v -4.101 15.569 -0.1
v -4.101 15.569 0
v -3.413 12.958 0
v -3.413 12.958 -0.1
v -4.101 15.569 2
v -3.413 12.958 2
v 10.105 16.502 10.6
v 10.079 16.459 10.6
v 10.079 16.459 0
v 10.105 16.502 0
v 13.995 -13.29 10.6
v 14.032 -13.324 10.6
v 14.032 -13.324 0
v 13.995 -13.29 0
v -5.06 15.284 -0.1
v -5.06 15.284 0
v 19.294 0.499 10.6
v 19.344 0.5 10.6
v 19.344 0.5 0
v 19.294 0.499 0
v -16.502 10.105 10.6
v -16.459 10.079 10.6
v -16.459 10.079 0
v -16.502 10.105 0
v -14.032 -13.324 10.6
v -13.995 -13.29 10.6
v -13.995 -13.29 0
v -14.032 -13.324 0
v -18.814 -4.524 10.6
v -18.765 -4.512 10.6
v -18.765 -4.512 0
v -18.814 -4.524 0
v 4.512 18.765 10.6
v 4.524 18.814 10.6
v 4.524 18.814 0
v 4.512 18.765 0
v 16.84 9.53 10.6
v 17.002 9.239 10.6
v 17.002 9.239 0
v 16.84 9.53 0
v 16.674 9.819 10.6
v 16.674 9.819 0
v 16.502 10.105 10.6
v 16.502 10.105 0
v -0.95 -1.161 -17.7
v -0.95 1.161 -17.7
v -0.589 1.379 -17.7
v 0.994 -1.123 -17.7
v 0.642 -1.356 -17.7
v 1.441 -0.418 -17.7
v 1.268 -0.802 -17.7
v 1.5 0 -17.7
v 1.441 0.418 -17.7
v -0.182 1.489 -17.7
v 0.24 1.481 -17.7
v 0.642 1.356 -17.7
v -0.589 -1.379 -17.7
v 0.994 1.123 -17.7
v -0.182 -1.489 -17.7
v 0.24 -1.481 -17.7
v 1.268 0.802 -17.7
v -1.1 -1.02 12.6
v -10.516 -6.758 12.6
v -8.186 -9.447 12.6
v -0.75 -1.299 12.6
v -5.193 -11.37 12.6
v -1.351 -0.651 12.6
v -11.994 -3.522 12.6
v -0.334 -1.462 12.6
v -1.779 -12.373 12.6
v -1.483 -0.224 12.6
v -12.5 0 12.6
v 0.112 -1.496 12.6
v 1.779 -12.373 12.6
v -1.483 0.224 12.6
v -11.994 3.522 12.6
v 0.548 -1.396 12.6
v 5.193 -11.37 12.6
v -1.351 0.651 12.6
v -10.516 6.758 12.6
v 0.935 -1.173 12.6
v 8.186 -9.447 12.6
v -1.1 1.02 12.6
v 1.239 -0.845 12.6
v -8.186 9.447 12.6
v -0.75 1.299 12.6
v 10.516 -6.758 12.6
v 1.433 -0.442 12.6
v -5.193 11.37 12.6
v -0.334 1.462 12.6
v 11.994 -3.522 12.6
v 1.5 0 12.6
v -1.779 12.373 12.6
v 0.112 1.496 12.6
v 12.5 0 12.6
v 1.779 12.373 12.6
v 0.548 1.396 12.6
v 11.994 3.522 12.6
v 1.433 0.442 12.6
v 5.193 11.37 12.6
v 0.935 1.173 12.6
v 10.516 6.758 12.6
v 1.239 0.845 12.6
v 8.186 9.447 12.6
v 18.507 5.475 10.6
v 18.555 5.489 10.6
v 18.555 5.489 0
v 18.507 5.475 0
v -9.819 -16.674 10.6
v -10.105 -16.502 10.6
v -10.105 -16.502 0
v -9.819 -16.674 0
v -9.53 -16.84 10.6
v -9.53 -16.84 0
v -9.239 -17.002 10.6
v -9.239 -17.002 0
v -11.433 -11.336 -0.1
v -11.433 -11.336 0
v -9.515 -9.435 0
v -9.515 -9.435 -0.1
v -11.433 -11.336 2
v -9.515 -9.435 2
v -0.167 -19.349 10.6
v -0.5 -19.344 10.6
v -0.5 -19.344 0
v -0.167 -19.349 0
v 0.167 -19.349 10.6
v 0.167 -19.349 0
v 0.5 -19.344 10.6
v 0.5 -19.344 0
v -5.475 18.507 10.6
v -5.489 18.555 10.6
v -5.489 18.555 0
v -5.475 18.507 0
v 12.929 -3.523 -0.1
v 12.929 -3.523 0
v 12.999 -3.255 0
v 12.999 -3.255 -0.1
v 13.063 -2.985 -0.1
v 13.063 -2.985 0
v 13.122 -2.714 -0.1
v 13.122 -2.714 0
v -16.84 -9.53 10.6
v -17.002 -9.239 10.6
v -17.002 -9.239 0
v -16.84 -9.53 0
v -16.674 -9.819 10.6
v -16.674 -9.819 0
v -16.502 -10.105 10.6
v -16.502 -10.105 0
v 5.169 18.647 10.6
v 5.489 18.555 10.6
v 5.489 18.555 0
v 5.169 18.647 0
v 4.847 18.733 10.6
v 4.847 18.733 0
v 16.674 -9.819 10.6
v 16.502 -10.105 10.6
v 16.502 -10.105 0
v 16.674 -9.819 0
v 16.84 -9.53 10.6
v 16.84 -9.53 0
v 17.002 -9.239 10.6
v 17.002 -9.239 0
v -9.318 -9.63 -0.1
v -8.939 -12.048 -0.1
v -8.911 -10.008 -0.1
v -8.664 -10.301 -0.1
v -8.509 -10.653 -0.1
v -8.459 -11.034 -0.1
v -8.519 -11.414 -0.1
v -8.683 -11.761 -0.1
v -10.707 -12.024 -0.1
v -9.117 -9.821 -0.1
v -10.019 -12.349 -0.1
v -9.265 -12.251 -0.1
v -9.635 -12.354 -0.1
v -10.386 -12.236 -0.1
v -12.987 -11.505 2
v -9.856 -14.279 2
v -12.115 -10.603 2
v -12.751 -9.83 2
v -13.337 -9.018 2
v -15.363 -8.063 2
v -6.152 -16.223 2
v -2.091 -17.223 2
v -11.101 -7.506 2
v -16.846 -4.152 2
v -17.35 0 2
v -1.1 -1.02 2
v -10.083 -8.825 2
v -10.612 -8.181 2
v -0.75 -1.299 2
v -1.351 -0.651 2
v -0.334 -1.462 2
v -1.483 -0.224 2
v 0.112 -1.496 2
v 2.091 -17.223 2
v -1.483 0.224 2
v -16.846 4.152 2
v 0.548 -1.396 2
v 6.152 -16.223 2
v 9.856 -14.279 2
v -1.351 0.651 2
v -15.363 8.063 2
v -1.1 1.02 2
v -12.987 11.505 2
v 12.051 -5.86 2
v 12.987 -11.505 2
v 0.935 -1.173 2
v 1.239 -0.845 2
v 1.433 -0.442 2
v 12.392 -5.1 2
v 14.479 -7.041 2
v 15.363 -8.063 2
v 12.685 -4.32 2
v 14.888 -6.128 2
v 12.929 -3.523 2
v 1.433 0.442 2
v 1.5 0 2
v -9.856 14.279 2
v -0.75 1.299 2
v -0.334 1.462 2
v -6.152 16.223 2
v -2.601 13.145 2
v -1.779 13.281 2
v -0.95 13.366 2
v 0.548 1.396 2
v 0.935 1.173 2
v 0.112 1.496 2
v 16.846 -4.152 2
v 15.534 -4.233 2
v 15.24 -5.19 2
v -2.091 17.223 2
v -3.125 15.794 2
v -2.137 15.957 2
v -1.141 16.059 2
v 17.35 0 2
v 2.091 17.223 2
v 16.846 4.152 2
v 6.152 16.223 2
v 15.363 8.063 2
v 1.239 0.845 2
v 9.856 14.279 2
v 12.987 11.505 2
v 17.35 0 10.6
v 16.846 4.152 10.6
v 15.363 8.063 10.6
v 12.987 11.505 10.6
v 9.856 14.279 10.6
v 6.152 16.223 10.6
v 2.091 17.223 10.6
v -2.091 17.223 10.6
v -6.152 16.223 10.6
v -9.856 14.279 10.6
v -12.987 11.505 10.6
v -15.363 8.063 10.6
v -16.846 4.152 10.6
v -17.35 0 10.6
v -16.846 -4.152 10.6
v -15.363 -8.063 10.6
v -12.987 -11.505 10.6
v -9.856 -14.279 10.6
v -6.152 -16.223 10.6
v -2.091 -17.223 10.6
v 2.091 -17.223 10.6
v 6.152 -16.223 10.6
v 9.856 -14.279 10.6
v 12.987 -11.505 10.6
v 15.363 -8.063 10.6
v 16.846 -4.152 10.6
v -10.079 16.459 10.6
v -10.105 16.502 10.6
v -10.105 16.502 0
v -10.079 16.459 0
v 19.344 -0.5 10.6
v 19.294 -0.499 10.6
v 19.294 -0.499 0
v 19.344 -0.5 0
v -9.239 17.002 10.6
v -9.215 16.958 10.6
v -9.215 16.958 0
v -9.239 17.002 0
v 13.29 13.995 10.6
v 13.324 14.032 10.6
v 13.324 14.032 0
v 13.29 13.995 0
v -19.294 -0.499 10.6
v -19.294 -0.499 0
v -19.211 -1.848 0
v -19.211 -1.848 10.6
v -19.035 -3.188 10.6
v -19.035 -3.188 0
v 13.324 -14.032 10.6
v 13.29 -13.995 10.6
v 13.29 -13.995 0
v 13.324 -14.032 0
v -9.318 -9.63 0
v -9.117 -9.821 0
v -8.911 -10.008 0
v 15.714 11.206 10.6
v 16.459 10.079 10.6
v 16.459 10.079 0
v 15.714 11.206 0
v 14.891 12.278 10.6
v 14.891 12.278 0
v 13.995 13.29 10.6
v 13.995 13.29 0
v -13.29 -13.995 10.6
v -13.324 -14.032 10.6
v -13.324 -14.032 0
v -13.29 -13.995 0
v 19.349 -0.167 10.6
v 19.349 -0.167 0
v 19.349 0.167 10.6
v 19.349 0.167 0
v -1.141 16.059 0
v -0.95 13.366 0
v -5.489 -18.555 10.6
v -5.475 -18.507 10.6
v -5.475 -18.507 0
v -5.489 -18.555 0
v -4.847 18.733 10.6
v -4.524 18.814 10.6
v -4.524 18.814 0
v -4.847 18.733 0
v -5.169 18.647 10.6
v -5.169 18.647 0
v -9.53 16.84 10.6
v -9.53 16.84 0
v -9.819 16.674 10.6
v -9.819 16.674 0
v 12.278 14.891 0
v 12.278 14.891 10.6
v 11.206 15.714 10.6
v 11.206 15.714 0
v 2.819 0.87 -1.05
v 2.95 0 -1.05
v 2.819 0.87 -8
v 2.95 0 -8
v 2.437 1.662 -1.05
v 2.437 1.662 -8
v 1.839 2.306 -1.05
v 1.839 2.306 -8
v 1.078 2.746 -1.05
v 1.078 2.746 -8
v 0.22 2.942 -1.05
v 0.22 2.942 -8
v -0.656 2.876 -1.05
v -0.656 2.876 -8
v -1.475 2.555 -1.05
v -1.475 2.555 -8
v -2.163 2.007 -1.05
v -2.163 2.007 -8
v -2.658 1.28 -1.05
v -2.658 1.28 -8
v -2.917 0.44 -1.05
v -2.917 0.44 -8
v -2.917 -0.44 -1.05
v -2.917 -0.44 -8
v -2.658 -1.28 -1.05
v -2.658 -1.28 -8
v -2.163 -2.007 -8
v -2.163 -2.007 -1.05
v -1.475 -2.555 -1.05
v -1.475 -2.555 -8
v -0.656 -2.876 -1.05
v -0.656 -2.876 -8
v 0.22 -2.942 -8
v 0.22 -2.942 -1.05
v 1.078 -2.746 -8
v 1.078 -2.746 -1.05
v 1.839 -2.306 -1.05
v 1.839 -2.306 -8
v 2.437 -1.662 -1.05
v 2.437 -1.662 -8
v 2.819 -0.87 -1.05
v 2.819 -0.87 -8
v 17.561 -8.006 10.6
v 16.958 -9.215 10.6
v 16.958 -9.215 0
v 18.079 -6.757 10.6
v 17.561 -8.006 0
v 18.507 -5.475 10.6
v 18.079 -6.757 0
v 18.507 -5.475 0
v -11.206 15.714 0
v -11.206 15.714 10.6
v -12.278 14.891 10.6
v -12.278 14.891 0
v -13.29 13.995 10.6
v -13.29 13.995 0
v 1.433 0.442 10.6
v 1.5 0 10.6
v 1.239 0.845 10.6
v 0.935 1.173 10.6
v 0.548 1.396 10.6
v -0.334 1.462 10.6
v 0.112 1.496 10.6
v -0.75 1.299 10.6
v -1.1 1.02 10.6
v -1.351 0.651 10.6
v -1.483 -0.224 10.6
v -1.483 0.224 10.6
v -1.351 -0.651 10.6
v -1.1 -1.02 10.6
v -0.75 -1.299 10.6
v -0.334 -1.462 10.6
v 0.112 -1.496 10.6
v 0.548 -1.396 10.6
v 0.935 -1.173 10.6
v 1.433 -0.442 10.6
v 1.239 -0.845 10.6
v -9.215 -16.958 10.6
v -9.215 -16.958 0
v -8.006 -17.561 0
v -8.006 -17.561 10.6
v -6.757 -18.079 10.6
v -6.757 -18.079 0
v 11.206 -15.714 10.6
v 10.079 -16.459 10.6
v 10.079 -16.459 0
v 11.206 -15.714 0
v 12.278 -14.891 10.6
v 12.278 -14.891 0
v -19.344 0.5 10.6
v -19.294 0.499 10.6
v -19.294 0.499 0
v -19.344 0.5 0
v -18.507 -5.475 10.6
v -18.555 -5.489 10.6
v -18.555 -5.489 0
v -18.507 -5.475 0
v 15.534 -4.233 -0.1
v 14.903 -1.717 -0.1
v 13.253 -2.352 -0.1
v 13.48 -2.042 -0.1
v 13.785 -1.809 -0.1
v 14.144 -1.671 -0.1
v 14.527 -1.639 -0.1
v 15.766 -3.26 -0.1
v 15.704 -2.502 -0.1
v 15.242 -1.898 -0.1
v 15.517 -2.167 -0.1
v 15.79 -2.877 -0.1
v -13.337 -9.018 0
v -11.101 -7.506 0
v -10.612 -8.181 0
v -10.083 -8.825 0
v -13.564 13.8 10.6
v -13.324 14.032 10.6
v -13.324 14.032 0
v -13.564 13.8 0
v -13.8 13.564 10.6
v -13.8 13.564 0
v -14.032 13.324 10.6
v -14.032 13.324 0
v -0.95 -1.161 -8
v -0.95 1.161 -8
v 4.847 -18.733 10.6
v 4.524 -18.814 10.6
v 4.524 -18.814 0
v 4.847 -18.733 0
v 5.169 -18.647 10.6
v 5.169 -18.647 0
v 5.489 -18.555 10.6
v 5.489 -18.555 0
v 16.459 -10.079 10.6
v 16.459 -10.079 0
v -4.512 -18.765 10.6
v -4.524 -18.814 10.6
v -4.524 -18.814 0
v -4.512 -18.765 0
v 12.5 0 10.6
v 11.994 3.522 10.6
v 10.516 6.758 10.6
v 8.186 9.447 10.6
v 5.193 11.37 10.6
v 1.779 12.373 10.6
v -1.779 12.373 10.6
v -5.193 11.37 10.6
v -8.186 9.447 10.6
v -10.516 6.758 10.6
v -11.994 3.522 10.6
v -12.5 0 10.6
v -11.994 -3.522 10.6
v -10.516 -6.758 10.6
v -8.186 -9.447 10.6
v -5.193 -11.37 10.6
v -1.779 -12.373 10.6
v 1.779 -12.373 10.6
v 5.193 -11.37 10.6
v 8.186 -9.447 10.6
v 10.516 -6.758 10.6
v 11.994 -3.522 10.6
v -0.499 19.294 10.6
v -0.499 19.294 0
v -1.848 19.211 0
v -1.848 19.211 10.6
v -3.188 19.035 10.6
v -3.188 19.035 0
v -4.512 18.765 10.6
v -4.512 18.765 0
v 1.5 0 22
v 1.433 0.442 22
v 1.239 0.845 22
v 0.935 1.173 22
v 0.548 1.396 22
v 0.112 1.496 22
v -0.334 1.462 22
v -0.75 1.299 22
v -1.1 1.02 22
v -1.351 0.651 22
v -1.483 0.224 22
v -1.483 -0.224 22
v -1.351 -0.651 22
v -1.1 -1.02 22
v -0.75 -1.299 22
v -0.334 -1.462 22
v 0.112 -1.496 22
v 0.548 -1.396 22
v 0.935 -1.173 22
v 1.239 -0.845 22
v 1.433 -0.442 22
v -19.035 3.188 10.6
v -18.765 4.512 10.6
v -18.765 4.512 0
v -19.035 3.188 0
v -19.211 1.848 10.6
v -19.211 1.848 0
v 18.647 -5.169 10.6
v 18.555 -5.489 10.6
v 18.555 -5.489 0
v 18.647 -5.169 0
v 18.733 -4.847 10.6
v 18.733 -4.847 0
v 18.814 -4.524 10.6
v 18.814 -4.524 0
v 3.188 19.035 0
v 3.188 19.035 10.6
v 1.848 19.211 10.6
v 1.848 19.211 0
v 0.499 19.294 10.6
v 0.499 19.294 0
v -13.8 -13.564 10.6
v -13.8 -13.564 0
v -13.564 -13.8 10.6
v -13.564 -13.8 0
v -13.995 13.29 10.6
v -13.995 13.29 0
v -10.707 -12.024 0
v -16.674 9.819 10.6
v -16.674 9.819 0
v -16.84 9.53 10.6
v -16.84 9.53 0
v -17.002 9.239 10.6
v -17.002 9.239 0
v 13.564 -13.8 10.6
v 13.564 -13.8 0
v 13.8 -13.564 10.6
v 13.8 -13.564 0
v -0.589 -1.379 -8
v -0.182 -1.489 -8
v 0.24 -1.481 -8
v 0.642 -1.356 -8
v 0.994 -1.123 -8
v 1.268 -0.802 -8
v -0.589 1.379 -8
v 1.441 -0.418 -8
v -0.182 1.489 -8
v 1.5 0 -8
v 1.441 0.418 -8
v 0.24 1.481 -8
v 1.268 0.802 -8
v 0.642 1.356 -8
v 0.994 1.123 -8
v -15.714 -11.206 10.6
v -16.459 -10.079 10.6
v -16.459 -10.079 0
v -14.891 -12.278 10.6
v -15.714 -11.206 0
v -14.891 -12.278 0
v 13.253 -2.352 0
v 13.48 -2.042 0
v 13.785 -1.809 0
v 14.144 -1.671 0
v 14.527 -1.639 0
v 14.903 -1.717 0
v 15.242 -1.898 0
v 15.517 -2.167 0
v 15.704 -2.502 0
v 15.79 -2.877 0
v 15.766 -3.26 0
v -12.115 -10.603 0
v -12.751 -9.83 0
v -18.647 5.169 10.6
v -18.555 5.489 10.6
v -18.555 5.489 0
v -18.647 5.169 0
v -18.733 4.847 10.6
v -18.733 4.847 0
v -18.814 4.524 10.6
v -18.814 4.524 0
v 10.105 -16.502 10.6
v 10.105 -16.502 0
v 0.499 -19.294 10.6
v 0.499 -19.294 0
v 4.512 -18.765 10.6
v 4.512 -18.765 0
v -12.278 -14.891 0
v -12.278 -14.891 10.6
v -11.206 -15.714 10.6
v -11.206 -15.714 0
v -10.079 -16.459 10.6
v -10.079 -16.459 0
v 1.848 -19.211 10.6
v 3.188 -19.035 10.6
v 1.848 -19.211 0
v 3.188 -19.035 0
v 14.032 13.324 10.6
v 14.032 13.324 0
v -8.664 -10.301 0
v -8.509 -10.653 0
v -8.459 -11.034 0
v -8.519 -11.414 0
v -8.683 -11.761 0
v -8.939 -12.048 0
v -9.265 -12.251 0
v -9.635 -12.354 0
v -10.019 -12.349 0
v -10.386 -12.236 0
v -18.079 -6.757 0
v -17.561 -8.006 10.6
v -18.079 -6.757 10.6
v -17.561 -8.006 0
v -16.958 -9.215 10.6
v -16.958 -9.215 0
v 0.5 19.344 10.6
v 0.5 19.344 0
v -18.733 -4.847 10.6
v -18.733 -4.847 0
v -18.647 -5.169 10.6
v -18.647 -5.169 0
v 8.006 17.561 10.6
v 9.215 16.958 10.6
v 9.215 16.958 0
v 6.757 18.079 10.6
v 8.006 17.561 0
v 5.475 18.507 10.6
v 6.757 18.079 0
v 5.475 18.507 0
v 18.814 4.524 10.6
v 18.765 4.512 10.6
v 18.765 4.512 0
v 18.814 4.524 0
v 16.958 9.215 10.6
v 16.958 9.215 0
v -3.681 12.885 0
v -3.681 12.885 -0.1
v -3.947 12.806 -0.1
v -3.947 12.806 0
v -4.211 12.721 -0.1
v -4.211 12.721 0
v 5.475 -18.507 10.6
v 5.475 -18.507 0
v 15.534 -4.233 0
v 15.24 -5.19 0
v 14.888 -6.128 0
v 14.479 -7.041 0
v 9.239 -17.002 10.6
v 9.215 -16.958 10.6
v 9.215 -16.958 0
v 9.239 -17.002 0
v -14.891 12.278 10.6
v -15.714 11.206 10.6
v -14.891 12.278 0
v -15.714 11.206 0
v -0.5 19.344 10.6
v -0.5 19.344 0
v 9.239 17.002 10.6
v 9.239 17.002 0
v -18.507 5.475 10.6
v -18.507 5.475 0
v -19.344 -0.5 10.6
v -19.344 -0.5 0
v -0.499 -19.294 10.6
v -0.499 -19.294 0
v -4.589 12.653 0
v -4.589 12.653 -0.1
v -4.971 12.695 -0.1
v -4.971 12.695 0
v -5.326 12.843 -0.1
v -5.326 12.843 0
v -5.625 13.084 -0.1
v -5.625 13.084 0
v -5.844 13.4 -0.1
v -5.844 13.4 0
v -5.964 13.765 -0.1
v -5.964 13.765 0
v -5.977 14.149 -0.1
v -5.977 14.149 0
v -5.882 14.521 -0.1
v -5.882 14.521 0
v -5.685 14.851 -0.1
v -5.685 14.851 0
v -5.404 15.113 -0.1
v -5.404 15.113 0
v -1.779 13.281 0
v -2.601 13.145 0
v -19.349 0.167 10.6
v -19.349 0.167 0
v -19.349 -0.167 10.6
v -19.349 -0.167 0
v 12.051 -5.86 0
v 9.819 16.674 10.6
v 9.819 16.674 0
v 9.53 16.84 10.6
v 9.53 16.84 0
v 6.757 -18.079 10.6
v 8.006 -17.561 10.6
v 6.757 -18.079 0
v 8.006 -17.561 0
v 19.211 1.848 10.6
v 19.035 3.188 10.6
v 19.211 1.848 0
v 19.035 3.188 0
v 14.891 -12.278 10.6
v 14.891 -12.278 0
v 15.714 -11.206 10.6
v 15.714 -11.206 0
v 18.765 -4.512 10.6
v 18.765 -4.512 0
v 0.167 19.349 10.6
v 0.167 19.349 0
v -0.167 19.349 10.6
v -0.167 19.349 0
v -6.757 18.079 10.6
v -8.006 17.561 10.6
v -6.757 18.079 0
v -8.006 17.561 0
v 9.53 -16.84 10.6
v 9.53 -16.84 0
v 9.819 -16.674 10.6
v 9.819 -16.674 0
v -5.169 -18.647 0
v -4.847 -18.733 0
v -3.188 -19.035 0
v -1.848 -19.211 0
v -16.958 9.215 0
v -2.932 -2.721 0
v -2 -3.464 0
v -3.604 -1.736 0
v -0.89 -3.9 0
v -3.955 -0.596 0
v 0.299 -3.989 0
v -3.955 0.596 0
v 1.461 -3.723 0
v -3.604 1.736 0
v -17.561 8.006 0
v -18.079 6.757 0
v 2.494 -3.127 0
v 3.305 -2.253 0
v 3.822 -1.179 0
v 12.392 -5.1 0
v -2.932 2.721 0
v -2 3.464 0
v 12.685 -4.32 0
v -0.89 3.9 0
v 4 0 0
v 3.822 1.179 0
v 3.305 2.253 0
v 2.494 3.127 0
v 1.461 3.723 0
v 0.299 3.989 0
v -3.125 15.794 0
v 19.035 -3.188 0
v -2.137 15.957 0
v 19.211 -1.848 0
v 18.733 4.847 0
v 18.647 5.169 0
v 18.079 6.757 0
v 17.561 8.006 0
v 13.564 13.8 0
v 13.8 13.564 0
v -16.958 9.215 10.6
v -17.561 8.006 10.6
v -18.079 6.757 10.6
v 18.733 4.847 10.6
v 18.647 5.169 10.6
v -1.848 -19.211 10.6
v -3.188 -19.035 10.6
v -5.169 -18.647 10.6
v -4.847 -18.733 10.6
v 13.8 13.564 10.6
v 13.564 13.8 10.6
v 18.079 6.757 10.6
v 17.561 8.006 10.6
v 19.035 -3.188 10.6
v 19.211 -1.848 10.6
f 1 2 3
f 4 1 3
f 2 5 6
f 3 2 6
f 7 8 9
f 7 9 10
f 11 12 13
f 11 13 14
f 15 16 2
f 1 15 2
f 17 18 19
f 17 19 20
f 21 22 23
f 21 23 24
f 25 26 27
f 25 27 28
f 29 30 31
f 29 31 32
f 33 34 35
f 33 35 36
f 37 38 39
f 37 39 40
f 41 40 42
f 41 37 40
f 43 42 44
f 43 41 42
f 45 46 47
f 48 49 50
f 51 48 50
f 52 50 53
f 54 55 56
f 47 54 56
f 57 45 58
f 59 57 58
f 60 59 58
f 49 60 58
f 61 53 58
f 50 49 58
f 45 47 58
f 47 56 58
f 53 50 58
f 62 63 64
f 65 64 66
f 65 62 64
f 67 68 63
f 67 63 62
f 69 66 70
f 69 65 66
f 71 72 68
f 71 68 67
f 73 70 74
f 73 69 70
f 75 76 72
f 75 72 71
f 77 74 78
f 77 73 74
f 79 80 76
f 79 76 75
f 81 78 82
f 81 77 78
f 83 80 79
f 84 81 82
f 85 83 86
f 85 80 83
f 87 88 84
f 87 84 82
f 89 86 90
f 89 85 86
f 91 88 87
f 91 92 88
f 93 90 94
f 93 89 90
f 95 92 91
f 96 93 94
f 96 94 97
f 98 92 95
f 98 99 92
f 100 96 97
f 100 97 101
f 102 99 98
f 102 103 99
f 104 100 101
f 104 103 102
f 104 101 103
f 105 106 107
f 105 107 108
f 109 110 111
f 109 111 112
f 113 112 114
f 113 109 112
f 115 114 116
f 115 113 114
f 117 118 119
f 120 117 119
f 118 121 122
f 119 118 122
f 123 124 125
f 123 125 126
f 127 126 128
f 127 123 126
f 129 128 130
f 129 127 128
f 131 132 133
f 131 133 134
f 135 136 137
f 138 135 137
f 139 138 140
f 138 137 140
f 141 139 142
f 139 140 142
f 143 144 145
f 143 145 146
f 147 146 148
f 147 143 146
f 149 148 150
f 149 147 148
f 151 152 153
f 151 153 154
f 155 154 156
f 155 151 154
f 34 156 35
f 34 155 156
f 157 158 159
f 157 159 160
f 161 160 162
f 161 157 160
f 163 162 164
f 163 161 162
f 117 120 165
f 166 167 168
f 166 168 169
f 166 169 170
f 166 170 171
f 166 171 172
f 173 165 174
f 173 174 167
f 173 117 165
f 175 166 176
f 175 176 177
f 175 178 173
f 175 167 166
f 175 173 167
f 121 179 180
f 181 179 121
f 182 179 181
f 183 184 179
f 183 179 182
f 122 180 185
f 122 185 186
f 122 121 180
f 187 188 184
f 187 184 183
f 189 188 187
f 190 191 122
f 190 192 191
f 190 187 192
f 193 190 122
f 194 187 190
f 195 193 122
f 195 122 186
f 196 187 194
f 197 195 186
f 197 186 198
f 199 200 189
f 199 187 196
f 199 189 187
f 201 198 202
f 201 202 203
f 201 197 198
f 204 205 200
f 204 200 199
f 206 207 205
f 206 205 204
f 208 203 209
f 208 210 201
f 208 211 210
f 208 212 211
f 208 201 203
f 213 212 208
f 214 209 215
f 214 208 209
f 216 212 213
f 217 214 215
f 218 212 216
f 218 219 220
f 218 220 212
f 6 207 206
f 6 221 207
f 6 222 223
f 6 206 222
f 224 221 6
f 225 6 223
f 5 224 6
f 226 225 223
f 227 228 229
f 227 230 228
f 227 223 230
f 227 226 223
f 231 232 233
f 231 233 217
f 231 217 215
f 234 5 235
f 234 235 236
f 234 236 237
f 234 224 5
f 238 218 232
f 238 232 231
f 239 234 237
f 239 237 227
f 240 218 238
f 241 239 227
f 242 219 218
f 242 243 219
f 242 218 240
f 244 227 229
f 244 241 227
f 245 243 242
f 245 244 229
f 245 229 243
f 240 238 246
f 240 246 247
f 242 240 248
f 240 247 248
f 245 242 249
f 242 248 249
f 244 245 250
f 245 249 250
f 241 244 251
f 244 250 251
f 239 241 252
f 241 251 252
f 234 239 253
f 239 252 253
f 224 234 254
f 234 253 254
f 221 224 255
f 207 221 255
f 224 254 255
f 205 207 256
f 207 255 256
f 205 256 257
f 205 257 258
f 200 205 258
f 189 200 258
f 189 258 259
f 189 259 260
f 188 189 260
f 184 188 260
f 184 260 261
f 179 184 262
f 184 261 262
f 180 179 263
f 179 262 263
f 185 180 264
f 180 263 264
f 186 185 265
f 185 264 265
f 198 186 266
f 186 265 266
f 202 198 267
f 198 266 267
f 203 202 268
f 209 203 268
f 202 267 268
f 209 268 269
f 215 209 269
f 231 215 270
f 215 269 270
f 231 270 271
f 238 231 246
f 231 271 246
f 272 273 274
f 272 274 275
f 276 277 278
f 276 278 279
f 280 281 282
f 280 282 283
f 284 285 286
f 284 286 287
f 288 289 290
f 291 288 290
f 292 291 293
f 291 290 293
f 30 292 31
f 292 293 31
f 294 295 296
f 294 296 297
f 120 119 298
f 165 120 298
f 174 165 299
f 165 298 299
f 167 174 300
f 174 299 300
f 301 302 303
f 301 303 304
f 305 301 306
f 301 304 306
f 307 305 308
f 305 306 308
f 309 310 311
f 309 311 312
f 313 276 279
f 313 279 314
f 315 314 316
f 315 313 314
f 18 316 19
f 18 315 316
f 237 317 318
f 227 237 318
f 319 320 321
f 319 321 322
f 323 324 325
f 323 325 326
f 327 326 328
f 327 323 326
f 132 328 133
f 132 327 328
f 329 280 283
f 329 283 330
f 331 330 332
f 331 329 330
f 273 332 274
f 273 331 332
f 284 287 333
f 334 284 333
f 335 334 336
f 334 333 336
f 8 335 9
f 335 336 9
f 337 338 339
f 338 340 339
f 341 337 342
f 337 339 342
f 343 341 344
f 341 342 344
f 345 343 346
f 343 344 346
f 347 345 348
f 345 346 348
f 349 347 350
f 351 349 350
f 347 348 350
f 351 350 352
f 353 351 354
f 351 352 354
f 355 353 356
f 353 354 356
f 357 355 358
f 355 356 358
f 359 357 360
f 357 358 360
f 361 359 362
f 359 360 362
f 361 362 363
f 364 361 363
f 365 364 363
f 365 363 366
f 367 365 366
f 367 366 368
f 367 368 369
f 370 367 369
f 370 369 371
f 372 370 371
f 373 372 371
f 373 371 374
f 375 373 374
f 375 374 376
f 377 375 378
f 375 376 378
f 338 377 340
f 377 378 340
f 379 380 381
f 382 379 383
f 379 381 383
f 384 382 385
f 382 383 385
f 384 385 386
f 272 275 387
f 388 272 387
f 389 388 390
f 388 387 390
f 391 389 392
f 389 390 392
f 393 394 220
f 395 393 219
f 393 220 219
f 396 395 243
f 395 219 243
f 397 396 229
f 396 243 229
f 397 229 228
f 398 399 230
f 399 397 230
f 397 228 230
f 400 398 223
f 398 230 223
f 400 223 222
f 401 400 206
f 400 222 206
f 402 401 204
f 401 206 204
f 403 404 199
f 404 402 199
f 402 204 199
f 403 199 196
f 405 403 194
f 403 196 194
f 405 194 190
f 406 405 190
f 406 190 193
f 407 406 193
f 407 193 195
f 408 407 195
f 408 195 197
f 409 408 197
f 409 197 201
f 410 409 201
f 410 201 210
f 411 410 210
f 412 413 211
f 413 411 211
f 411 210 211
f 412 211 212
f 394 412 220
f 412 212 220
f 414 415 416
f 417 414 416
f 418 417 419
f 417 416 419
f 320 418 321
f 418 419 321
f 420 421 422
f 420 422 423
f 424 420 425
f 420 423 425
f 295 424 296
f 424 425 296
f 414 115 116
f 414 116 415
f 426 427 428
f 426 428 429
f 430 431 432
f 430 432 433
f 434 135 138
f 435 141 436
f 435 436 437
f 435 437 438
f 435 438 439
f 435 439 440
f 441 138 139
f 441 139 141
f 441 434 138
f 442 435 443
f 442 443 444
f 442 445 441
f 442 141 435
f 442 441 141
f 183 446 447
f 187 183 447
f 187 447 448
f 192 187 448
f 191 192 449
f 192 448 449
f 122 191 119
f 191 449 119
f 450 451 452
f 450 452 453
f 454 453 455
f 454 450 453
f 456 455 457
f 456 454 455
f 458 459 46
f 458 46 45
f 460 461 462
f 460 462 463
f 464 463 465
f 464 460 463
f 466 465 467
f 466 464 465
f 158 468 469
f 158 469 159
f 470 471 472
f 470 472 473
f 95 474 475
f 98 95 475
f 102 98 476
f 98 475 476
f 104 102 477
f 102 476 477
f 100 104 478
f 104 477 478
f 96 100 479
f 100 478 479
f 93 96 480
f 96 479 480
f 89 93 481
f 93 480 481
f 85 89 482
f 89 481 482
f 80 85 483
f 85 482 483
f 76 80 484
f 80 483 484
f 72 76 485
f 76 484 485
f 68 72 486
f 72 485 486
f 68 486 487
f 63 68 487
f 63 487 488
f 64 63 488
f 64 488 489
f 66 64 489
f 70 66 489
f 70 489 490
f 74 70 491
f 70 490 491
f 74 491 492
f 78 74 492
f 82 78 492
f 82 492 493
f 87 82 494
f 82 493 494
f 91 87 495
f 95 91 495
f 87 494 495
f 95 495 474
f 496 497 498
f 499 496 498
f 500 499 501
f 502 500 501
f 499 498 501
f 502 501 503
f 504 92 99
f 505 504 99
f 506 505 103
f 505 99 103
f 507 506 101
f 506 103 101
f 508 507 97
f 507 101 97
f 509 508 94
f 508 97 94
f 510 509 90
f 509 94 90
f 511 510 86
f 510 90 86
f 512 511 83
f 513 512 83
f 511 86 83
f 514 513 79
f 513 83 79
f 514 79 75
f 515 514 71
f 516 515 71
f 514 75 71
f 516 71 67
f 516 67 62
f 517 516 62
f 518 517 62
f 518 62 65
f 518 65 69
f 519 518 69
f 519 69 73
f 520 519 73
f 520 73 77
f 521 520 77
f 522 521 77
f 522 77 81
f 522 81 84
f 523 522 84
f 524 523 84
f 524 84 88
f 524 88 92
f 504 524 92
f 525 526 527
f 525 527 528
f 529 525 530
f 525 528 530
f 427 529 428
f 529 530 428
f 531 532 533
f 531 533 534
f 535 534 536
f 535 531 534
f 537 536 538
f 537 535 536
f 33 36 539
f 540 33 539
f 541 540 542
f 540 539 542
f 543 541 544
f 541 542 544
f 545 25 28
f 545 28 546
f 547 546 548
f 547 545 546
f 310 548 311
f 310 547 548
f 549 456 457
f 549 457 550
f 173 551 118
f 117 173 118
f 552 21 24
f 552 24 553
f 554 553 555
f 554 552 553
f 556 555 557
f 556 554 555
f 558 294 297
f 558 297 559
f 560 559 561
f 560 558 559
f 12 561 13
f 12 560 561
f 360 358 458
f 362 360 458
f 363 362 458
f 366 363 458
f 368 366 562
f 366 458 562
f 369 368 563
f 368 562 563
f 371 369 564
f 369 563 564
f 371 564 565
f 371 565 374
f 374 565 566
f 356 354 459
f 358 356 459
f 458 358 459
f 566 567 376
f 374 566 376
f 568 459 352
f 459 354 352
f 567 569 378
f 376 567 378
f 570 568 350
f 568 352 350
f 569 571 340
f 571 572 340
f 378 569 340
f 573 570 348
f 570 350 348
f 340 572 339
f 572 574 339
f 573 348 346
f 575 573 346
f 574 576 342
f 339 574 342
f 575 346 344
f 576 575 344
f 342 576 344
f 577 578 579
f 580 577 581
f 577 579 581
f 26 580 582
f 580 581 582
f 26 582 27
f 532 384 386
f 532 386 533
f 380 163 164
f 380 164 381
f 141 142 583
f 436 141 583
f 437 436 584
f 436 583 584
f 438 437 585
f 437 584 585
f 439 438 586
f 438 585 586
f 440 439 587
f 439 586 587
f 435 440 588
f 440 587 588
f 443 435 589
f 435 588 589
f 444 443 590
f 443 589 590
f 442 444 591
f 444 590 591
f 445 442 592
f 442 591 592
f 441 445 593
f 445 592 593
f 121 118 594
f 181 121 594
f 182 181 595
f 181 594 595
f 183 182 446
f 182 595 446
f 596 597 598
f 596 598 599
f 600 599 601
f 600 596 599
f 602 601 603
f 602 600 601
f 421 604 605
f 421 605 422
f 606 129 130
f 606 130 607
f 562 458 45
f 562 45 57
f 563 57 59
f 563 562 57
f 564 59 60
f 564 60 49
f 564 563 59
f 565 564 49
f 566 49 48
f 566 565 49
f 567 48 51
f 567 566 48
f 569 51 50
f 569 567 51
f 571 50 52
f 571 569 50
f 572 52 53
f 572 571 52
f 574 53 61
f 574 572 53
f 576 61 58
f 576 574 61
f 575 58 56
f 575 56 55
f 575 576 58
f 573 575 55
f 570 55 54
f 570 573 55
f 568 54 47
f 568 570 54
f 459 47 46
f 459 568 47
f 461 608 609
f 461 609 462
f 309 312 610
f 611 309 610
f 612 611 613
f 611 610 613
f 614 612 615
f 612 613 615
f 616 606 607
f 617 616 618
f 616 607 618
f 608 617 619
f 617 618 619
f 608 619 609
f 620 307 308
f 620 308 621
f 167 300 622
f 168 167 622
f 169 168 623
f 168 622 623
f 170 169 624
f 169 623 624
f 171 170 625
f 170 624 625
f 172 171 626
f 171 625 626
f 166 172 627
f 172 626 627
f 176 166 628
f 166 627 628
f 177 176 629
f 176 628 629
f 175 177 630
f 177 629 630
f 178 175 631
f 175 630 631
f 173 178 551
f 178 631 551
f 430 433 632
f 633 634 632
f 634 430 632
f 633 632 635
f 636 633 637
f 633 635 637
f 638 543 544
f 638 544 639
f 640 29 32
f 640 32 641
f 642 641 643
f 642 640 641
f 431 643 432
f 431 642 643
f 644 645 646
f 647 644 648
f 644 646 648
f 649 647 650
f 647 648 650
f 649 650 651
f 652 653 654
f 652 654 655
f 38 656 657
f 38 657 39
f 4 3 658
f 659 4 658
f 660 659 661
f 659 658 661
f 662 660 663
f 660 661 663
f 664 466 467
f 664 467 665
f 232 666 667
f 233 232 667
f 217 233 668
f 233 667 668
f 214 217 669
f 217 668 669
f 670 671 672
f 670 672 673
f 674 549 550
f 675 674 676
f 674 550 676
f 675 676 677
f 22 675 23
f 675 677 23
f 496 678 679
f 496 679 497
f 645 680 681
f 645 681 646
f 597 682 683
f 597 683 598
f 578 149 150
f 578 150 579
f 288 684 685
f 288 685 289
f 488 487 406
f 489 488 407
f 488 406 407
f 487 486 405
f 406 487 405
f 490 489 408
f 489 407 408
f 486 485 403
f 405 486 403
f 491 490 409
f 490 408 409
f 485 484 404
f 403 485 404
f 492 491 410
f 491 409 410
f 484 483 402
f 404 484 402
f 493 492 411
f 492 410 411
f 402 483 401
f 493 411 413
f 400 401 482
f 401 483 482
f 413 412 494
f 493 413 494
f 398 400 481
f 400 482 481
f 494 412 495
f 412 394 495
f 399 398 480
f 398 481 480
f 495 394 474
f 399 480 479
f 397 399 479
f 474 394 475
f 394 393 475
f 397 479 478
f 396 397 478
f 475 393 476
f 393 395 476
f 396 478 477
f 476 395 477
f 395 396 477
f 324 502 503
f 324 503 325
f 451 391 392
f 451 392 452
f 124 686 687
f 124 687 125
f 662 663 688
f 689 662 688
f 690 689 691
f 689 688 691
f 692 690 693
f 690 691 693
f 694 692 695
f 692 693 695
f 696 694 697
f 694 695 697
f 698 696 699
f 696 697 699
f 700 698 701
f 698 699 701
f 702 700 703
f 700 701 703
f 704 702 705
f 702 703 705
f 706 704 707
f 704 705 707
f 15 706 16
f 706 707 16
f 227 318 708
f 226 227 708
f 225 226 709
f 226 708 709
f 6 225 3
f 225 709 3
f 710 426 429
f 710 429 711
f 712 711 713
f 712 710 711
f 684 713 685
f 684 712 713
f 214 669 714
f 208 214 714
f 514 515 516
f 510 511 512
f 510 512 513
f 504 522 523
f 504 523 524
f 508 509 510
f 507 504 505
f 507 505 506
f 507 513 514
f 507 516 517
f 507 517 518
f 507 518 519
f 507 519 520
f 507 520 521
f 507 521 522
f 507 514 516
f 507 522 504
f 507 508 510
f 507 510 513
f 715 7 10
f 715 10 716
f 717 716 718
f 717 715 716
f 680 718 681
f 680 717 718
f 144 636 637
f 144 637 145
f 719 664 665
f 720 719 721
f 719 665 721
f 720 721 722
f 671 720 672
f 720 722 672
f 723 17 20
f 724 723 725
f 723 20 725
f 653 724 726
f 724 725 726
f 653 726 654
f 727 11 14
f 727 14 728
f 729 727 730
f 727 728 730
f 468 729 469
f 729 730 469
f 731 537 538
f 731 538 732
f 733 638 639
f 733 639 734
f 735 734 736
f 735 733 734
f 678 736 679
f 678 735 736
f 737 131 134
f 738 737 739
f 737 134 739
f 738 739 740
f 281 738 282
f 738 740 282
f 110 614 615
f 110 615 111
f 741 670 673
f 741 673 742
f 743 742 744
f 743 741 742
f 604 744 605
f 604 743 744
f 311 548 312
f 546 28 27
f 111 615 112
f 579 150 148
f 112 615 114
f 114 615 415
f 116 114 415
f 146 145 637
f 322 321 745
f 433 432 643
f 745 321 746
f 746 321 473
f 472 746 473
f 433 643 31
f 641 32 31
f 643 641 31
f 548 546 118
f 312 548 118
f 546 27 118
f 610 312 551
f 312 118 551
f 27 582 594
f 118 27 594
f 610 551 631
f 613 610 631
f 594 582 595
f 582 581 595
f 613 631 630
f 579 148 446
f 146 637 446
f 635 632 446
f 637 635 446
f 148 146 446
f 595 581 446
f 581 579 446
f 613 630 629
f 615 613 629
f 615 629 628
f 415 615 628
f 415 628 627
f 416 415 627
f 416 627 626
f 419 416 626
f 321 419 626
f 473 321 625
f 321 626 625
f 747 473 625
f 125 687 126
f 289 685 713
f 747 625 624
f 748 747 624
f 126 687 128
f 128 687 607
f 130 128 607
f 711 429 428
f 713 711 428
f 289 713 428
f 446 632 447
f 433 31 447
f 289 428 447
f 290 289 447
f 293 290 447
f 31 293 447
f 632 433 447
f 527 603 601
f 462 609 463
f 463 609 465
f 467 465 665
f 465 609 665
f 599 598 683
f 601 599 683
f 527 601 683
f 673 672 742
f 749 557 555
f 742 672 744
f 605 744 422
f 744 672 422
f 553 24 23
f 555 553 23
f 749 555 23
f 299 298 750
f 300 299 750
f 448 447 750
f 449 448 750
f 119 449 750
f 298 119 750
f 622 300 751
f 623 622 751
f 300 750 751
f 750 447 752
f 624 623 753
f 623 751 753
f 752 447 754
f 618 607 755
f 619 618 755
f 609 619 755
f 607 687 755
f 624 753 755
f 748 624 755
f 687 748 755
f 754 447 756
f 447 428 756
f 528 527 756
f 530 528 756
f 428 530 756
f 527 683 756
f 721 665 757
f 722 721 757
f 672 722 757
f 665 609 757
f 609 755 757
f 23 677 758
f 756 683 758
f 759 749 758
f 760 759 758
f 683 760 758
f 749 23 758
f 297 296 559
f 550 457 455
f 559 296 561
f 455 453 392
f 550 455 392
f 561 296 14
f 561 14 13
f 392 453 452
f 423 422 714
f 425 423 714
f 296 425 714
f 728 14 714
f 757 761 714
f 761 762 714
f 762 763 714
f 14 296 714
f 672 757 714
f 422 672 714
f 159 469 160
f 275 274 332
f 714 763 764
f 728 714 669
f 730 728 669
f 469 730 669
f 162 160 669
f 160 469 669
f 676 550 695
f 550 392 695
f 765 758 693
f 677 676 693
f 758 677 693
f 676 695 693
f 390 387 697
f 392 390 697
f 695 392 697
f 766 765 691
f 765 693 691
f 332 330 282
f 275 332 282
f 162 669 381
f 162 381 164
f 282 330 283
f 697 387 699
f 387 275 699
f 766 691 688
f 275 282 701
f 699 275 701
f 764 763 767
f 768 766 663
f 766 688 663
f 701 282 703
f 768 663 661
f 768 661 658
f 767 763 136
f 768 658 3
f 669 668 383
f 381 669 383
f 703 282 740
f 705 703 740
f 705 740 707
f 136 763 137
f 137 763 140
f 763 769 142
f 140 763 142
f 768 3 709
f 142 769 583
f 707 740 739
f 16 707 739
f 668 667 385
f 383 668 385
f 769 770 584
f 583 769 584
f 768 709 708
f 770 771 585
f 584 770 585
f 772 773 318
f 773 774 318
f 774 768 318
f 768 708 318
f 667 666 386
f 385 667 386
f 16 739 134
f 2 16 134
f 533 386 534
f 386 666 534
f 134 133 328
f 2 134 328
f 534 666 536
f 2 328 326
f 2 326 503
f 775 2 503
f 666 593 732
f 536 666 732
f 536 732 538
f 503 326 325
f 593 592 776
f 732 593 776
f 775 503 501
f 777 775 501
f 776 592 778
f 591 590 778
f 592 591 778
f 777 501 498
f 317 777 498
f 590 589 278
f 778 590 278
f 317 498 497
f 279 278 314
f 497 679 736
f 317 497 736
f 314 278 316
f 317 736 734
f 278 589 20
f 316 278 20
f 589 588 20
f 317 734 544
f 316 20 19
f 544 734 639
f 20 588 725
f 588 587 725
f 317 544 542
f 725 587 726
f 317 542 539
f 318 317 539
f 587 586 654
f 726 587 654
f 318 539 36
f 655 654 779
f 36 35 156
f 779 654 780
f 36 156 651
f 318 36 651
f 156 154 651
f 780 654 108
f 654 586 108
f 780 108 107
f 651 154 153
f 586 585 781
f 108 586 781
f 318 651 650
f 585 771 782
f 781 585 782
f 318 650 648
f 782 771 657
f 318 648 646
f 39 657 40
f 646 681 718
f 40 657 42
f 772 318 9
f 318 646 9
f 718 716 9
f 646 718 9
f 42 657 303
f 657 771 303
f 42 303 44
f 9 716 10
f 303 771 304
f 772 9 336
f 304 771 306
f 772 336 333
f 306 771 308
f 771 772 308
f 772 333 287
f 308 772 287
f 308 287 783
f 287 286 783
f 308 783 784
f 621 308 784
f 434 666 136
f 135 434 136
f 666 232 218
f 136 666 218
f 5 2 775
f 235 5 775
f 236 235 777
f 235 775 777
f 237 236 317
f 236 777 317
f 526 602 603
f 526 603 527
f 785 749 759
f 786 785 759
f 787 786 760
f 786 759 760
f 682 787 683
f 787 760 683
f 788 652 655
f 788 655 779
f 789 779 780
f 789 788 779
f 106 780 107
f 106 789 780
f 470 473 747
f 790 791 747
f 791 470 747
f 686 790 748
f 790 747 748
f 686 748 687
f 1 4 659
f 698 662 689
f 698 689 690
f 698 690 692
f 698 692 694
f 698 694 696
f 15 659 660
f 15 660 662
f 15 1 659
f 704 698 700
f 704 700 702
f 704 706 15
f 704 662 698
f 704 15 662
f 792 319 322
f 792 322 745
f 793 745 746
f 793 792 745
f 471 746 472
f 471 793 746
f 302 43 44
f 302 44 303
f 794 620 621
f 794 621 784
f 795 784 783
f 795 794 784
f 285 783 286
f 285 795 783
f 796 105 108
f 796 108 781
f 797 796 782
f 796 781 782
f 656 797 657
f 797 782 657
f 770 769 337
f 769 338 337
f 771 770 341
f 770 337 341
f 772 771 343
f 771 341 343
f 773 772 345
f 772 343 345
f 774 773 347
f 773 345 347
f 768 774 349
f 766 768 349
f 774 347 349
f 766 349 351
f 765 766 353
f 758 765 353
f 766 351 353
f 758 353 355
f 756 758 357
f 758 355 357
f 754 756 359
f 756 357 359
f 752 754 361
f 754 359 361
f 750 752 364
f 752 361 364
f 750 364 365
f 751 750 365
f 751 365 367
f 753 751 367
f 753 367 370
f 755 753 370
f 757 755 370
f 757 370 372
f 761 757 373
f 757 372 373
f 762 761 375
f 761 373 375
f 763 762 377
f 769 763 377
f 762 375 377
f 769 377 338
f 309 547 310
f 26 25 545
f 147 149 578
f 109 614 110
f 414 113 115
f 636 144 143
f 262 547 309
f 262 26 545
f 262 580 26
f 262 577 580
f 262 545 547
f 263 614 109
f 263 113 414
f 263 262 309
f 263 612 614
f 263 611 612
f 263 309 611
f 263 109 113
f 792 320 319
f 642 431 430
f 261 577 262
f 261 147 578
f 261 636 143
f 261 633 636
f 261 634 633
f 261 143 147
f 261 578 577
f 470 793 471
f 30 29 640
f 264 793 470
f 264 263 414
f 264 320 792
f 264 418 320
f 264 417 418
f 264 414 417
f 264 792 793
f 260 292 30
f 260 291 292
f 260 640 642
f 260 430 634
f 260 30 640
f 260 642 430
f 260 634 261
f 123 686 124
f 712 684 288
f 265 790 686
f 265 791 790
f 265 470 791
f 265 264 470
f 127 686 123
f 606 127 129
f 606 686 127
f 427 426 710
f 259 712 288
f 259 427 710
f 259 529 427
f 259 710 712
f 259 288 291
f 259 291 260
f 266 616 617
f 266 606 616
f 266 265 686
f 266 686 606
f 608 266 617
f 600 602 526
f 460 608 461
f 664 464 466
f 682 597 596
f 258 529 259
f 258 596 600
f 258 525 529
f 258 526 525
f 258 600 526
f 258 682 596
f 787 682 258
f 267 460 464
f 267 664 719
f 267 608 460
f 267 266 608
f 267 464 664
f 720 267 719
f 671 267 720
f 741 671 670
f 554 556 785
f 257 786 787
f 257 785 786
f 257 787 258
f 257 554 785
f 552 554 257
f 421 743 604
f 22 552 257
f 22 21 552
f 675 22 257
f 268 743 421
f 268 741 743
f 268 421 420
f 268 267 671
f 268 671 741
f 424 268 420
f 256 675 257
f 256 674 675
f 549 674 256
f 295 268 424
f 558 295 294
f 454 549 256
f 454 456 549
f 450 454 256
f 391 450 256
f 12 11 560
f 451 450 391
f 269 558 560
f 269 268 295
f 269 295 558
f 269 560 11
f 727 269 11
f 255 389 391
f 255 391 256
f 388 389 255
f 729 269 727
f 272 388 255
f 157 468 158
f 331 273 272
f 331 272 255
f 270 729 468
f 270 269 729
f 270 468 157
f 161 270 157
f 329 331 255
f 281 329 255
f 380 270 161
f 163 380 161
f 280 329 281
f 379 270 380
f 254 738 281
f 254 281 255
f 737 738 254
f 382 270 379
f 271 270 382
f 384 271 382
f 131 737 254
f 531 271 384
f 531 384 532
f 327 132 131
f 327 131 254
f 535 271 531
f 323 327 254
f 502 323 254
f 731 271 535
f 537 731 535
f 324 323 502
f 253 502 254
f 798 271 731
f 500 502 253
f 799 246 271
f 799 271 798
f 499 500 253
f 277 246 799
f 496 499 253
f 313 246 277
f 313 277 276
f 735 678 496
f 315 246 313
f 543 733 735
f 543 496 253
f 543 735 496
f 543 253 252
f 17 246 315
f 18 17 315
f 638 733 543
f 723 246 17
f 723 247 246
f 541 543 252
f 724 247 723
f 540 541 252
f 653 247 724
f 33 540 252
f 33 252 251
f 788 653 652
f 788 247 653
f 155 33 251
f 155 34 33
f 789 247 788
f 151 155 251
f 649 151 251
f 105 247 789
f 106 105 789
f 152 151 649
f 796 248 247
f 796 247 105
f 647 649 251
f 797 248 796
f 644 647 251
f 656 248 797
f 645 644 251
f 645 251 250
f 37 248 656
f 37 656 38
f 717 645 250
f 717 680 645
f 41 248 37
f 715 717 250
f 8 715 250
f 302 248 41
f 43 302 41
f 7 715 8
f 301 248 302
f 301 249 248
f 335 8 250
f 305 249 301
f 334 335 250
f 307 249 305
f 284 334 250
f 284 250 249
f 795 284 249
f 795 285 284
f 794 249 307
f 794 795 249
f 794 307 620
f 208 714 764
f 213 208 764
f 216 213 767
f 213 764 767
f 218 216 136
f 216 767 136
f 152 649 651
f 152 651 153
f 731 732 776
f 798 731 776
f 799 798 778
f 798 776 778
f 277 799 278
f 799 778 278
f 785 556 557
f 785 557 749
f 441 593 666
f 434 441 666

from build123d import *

# Parameters (mm, degrees)
SKETCH1_R           = 19.3
BOSS_EXTRUDE1_DEPTH = 10.6
BOSS_EXTRUDE3_DEPTH = 10.6
SKETCH8_R           = 17.35
CUT_EXTRUDE2_DEPTH  = 8.6
CIRPATTERN1_COUNT   = 24
BOSS_EXTRUDE4_DEPTH = 9.7
CUT_EXTRUDE1_DEPTH  = 11.6
BOSS_EXTRUDE5_DEPTH = 0.1
CIRPATTERN2_COUNT   = 3
SKETCH10_R          = 1.5
BOSS_EXTRUDE6_DEPTH = 20
SKETCH11_R          = 12.5
BOSS_EXTRUDE7_DEPTH = 2


with BuildPart() as part:
    # Sketch1 → Boss-Extrude1 (new body)
    with BuildSketch(Plane.XY):
        Circle(SKETCH1_R)
    extrude(amount=BOSS_EXTRUDE1_DEPTH)

    # Sketch3 → Boss-Extrude3 (add, through all)
    with BuildSketch(Plane.XY.offset(10.6)):
        with BuildLine():
            Line((-0.5, 19.343538973), (-0.49870801, 19.293555668))
            ThreePointArc((-0.49870801, 19.293555668), (0, 19.3), (0.49870801, 19.293555668))
            Line((0.49870801, 19.293555668), (0.5, 19.343538973))
            ThreePointArc((0.5, 19.343538973), (0, 19.35), (-0.5, 19.343538973))
        make_face()
    boss_extrude3 = extrude(amount=-BOSS_EXTRUDE3_DEPTH)

    # Sketch8 → Cut-Extrude2 (cut)
    with BuildSketch(Plane.XY.offset(10.6)):
        Circle(SKETCH8_R)
    extrude(amount=-CUT_EXTRUDE2_DEPTH, mode=Mode.SUBTRACT)

    # CirPattern1: Boss-Extrude3 ×24 about axis
    cirpattern1_axis = Axis((0, 0, 0), (0, 0, 1))
    for i in range(1, CIRPATTERN1_COUNT):
        add(boss_extrude3.rotate(cirpattern1_axis, i * 360 / CIRPATTERN1_COUNT))

    # Sketch5 → Revolve1 (revolve)
    with BuildSketch(Plane(origin=(0, 0, 0), x_dir=(1, 0, 0), z_dir=(0, 1, 0))):
        Polygon((0, 0), (4, 0), (2.95, 1.05), (2.95, 8), (0, 8), align=None)
    revolve(axis=Axis((0, 0, -8), (0, 0, 1)))

    # Sketch6 → Boss-Extrude4 (add)
    with BuildSketch(Plane(origin=(0, 0, -8), x_dir=(-1, 0, 0), z_dir=(0, 0, -1))):
        with BuildLine():
            Line((0.95, 1.160818677), (0.95, -1.160818677))
            ThreePointArc((0.95, -1.160818677), (-1.5, 0), (0.95, 1.160818677))
        make_face()
    extrude(amount=BOSS_EXTRUDE4_DEPTH)

    # Sketch7 → Cut-Extrude1 (cut, through all)
    with BuildSketch(Plane(origin=(0, 0, 0), x_dir=(-1, 0, 0), z_dir=(0, 0, -1))):
        with BuildLine():
            Line((1.14141791, 16.059488322), (0.95, 13.366282206))
            ThreePointArc((0.95, 13.366282206), (2.191173704, 13.219635313), (3.413286083, 12.957988969))
            Line((3.413286083, 12.957988969), (4.101037757, 15.568927045))
            ThreePointArc((4.101037757, 15.568927045), (2.632678854, 15.883293174), (1.14141791, 16.059488322))
        make_face()
    cut_extrude1 = extrude(amount=-CUT_EXTRUDE1_DEPTH, mode=Mode.SUBTRACT)

    # Sketch9 → Boss-Extrude5 (add)
    with BuildSketch(Plane(origin=(0, 0, 0), x_dir=(-1, 0, 0), z_dir=(0, 0, -1))):
        with BuildLine():
            Line((4.101037757, 15.568927045), (3.413286083, 12.957988969))
            ThreePointArc((3.413286083, 12.957988969), (3.814061699, 12.845735999), (4.211157884, 12.721090727))
            ThreePointArc((4.211157884, 12.721090727), (5.917018752, 13.578434707), (5.059674771, 15.284295574))
            Line((5.059674771, 15.284295574), (4.101037757, 15.568927045))
        make_face()
    boss_extrude5 = extrude(amount=BOSS_EXTRUDE5_DEPTH)

    # CirPattern2: Cut-Extrude1, Boss-Extrude5 ×3 about axis
    cirpattern2_axis = Axis((0, 0, 0), (0, 0, 1))
    for i in range(1, CIRPATTERN2_COUNT):
        add(cut_extrude1.rotate(cirpattern2_axis, i * 360 / CIRPATTERN2_COUNT), mode=Mode.SUBTRACT)
        add(boss_extrude5.rotate(cirpattern2_axis, i * 360 / CIRPATTERN2_COUNT))

    # Sketch10 → Boss-Extrude6 (add)
    with BuildSketch(Plane.XY.offset(2)):
        Circle(SKETCH10_R)
    extrude(amount=BOSS_EXTRUDE6_DEPTH)

    # Sketch11 → Boss-Extrude7 (add)
    with BuildSketch(Plane.XY.offset(10.6)):
        Circle(SKETCH11_R)
    extrude(amount=BOSS_EXTRUDE7_DEPTH)


solid = part.part
